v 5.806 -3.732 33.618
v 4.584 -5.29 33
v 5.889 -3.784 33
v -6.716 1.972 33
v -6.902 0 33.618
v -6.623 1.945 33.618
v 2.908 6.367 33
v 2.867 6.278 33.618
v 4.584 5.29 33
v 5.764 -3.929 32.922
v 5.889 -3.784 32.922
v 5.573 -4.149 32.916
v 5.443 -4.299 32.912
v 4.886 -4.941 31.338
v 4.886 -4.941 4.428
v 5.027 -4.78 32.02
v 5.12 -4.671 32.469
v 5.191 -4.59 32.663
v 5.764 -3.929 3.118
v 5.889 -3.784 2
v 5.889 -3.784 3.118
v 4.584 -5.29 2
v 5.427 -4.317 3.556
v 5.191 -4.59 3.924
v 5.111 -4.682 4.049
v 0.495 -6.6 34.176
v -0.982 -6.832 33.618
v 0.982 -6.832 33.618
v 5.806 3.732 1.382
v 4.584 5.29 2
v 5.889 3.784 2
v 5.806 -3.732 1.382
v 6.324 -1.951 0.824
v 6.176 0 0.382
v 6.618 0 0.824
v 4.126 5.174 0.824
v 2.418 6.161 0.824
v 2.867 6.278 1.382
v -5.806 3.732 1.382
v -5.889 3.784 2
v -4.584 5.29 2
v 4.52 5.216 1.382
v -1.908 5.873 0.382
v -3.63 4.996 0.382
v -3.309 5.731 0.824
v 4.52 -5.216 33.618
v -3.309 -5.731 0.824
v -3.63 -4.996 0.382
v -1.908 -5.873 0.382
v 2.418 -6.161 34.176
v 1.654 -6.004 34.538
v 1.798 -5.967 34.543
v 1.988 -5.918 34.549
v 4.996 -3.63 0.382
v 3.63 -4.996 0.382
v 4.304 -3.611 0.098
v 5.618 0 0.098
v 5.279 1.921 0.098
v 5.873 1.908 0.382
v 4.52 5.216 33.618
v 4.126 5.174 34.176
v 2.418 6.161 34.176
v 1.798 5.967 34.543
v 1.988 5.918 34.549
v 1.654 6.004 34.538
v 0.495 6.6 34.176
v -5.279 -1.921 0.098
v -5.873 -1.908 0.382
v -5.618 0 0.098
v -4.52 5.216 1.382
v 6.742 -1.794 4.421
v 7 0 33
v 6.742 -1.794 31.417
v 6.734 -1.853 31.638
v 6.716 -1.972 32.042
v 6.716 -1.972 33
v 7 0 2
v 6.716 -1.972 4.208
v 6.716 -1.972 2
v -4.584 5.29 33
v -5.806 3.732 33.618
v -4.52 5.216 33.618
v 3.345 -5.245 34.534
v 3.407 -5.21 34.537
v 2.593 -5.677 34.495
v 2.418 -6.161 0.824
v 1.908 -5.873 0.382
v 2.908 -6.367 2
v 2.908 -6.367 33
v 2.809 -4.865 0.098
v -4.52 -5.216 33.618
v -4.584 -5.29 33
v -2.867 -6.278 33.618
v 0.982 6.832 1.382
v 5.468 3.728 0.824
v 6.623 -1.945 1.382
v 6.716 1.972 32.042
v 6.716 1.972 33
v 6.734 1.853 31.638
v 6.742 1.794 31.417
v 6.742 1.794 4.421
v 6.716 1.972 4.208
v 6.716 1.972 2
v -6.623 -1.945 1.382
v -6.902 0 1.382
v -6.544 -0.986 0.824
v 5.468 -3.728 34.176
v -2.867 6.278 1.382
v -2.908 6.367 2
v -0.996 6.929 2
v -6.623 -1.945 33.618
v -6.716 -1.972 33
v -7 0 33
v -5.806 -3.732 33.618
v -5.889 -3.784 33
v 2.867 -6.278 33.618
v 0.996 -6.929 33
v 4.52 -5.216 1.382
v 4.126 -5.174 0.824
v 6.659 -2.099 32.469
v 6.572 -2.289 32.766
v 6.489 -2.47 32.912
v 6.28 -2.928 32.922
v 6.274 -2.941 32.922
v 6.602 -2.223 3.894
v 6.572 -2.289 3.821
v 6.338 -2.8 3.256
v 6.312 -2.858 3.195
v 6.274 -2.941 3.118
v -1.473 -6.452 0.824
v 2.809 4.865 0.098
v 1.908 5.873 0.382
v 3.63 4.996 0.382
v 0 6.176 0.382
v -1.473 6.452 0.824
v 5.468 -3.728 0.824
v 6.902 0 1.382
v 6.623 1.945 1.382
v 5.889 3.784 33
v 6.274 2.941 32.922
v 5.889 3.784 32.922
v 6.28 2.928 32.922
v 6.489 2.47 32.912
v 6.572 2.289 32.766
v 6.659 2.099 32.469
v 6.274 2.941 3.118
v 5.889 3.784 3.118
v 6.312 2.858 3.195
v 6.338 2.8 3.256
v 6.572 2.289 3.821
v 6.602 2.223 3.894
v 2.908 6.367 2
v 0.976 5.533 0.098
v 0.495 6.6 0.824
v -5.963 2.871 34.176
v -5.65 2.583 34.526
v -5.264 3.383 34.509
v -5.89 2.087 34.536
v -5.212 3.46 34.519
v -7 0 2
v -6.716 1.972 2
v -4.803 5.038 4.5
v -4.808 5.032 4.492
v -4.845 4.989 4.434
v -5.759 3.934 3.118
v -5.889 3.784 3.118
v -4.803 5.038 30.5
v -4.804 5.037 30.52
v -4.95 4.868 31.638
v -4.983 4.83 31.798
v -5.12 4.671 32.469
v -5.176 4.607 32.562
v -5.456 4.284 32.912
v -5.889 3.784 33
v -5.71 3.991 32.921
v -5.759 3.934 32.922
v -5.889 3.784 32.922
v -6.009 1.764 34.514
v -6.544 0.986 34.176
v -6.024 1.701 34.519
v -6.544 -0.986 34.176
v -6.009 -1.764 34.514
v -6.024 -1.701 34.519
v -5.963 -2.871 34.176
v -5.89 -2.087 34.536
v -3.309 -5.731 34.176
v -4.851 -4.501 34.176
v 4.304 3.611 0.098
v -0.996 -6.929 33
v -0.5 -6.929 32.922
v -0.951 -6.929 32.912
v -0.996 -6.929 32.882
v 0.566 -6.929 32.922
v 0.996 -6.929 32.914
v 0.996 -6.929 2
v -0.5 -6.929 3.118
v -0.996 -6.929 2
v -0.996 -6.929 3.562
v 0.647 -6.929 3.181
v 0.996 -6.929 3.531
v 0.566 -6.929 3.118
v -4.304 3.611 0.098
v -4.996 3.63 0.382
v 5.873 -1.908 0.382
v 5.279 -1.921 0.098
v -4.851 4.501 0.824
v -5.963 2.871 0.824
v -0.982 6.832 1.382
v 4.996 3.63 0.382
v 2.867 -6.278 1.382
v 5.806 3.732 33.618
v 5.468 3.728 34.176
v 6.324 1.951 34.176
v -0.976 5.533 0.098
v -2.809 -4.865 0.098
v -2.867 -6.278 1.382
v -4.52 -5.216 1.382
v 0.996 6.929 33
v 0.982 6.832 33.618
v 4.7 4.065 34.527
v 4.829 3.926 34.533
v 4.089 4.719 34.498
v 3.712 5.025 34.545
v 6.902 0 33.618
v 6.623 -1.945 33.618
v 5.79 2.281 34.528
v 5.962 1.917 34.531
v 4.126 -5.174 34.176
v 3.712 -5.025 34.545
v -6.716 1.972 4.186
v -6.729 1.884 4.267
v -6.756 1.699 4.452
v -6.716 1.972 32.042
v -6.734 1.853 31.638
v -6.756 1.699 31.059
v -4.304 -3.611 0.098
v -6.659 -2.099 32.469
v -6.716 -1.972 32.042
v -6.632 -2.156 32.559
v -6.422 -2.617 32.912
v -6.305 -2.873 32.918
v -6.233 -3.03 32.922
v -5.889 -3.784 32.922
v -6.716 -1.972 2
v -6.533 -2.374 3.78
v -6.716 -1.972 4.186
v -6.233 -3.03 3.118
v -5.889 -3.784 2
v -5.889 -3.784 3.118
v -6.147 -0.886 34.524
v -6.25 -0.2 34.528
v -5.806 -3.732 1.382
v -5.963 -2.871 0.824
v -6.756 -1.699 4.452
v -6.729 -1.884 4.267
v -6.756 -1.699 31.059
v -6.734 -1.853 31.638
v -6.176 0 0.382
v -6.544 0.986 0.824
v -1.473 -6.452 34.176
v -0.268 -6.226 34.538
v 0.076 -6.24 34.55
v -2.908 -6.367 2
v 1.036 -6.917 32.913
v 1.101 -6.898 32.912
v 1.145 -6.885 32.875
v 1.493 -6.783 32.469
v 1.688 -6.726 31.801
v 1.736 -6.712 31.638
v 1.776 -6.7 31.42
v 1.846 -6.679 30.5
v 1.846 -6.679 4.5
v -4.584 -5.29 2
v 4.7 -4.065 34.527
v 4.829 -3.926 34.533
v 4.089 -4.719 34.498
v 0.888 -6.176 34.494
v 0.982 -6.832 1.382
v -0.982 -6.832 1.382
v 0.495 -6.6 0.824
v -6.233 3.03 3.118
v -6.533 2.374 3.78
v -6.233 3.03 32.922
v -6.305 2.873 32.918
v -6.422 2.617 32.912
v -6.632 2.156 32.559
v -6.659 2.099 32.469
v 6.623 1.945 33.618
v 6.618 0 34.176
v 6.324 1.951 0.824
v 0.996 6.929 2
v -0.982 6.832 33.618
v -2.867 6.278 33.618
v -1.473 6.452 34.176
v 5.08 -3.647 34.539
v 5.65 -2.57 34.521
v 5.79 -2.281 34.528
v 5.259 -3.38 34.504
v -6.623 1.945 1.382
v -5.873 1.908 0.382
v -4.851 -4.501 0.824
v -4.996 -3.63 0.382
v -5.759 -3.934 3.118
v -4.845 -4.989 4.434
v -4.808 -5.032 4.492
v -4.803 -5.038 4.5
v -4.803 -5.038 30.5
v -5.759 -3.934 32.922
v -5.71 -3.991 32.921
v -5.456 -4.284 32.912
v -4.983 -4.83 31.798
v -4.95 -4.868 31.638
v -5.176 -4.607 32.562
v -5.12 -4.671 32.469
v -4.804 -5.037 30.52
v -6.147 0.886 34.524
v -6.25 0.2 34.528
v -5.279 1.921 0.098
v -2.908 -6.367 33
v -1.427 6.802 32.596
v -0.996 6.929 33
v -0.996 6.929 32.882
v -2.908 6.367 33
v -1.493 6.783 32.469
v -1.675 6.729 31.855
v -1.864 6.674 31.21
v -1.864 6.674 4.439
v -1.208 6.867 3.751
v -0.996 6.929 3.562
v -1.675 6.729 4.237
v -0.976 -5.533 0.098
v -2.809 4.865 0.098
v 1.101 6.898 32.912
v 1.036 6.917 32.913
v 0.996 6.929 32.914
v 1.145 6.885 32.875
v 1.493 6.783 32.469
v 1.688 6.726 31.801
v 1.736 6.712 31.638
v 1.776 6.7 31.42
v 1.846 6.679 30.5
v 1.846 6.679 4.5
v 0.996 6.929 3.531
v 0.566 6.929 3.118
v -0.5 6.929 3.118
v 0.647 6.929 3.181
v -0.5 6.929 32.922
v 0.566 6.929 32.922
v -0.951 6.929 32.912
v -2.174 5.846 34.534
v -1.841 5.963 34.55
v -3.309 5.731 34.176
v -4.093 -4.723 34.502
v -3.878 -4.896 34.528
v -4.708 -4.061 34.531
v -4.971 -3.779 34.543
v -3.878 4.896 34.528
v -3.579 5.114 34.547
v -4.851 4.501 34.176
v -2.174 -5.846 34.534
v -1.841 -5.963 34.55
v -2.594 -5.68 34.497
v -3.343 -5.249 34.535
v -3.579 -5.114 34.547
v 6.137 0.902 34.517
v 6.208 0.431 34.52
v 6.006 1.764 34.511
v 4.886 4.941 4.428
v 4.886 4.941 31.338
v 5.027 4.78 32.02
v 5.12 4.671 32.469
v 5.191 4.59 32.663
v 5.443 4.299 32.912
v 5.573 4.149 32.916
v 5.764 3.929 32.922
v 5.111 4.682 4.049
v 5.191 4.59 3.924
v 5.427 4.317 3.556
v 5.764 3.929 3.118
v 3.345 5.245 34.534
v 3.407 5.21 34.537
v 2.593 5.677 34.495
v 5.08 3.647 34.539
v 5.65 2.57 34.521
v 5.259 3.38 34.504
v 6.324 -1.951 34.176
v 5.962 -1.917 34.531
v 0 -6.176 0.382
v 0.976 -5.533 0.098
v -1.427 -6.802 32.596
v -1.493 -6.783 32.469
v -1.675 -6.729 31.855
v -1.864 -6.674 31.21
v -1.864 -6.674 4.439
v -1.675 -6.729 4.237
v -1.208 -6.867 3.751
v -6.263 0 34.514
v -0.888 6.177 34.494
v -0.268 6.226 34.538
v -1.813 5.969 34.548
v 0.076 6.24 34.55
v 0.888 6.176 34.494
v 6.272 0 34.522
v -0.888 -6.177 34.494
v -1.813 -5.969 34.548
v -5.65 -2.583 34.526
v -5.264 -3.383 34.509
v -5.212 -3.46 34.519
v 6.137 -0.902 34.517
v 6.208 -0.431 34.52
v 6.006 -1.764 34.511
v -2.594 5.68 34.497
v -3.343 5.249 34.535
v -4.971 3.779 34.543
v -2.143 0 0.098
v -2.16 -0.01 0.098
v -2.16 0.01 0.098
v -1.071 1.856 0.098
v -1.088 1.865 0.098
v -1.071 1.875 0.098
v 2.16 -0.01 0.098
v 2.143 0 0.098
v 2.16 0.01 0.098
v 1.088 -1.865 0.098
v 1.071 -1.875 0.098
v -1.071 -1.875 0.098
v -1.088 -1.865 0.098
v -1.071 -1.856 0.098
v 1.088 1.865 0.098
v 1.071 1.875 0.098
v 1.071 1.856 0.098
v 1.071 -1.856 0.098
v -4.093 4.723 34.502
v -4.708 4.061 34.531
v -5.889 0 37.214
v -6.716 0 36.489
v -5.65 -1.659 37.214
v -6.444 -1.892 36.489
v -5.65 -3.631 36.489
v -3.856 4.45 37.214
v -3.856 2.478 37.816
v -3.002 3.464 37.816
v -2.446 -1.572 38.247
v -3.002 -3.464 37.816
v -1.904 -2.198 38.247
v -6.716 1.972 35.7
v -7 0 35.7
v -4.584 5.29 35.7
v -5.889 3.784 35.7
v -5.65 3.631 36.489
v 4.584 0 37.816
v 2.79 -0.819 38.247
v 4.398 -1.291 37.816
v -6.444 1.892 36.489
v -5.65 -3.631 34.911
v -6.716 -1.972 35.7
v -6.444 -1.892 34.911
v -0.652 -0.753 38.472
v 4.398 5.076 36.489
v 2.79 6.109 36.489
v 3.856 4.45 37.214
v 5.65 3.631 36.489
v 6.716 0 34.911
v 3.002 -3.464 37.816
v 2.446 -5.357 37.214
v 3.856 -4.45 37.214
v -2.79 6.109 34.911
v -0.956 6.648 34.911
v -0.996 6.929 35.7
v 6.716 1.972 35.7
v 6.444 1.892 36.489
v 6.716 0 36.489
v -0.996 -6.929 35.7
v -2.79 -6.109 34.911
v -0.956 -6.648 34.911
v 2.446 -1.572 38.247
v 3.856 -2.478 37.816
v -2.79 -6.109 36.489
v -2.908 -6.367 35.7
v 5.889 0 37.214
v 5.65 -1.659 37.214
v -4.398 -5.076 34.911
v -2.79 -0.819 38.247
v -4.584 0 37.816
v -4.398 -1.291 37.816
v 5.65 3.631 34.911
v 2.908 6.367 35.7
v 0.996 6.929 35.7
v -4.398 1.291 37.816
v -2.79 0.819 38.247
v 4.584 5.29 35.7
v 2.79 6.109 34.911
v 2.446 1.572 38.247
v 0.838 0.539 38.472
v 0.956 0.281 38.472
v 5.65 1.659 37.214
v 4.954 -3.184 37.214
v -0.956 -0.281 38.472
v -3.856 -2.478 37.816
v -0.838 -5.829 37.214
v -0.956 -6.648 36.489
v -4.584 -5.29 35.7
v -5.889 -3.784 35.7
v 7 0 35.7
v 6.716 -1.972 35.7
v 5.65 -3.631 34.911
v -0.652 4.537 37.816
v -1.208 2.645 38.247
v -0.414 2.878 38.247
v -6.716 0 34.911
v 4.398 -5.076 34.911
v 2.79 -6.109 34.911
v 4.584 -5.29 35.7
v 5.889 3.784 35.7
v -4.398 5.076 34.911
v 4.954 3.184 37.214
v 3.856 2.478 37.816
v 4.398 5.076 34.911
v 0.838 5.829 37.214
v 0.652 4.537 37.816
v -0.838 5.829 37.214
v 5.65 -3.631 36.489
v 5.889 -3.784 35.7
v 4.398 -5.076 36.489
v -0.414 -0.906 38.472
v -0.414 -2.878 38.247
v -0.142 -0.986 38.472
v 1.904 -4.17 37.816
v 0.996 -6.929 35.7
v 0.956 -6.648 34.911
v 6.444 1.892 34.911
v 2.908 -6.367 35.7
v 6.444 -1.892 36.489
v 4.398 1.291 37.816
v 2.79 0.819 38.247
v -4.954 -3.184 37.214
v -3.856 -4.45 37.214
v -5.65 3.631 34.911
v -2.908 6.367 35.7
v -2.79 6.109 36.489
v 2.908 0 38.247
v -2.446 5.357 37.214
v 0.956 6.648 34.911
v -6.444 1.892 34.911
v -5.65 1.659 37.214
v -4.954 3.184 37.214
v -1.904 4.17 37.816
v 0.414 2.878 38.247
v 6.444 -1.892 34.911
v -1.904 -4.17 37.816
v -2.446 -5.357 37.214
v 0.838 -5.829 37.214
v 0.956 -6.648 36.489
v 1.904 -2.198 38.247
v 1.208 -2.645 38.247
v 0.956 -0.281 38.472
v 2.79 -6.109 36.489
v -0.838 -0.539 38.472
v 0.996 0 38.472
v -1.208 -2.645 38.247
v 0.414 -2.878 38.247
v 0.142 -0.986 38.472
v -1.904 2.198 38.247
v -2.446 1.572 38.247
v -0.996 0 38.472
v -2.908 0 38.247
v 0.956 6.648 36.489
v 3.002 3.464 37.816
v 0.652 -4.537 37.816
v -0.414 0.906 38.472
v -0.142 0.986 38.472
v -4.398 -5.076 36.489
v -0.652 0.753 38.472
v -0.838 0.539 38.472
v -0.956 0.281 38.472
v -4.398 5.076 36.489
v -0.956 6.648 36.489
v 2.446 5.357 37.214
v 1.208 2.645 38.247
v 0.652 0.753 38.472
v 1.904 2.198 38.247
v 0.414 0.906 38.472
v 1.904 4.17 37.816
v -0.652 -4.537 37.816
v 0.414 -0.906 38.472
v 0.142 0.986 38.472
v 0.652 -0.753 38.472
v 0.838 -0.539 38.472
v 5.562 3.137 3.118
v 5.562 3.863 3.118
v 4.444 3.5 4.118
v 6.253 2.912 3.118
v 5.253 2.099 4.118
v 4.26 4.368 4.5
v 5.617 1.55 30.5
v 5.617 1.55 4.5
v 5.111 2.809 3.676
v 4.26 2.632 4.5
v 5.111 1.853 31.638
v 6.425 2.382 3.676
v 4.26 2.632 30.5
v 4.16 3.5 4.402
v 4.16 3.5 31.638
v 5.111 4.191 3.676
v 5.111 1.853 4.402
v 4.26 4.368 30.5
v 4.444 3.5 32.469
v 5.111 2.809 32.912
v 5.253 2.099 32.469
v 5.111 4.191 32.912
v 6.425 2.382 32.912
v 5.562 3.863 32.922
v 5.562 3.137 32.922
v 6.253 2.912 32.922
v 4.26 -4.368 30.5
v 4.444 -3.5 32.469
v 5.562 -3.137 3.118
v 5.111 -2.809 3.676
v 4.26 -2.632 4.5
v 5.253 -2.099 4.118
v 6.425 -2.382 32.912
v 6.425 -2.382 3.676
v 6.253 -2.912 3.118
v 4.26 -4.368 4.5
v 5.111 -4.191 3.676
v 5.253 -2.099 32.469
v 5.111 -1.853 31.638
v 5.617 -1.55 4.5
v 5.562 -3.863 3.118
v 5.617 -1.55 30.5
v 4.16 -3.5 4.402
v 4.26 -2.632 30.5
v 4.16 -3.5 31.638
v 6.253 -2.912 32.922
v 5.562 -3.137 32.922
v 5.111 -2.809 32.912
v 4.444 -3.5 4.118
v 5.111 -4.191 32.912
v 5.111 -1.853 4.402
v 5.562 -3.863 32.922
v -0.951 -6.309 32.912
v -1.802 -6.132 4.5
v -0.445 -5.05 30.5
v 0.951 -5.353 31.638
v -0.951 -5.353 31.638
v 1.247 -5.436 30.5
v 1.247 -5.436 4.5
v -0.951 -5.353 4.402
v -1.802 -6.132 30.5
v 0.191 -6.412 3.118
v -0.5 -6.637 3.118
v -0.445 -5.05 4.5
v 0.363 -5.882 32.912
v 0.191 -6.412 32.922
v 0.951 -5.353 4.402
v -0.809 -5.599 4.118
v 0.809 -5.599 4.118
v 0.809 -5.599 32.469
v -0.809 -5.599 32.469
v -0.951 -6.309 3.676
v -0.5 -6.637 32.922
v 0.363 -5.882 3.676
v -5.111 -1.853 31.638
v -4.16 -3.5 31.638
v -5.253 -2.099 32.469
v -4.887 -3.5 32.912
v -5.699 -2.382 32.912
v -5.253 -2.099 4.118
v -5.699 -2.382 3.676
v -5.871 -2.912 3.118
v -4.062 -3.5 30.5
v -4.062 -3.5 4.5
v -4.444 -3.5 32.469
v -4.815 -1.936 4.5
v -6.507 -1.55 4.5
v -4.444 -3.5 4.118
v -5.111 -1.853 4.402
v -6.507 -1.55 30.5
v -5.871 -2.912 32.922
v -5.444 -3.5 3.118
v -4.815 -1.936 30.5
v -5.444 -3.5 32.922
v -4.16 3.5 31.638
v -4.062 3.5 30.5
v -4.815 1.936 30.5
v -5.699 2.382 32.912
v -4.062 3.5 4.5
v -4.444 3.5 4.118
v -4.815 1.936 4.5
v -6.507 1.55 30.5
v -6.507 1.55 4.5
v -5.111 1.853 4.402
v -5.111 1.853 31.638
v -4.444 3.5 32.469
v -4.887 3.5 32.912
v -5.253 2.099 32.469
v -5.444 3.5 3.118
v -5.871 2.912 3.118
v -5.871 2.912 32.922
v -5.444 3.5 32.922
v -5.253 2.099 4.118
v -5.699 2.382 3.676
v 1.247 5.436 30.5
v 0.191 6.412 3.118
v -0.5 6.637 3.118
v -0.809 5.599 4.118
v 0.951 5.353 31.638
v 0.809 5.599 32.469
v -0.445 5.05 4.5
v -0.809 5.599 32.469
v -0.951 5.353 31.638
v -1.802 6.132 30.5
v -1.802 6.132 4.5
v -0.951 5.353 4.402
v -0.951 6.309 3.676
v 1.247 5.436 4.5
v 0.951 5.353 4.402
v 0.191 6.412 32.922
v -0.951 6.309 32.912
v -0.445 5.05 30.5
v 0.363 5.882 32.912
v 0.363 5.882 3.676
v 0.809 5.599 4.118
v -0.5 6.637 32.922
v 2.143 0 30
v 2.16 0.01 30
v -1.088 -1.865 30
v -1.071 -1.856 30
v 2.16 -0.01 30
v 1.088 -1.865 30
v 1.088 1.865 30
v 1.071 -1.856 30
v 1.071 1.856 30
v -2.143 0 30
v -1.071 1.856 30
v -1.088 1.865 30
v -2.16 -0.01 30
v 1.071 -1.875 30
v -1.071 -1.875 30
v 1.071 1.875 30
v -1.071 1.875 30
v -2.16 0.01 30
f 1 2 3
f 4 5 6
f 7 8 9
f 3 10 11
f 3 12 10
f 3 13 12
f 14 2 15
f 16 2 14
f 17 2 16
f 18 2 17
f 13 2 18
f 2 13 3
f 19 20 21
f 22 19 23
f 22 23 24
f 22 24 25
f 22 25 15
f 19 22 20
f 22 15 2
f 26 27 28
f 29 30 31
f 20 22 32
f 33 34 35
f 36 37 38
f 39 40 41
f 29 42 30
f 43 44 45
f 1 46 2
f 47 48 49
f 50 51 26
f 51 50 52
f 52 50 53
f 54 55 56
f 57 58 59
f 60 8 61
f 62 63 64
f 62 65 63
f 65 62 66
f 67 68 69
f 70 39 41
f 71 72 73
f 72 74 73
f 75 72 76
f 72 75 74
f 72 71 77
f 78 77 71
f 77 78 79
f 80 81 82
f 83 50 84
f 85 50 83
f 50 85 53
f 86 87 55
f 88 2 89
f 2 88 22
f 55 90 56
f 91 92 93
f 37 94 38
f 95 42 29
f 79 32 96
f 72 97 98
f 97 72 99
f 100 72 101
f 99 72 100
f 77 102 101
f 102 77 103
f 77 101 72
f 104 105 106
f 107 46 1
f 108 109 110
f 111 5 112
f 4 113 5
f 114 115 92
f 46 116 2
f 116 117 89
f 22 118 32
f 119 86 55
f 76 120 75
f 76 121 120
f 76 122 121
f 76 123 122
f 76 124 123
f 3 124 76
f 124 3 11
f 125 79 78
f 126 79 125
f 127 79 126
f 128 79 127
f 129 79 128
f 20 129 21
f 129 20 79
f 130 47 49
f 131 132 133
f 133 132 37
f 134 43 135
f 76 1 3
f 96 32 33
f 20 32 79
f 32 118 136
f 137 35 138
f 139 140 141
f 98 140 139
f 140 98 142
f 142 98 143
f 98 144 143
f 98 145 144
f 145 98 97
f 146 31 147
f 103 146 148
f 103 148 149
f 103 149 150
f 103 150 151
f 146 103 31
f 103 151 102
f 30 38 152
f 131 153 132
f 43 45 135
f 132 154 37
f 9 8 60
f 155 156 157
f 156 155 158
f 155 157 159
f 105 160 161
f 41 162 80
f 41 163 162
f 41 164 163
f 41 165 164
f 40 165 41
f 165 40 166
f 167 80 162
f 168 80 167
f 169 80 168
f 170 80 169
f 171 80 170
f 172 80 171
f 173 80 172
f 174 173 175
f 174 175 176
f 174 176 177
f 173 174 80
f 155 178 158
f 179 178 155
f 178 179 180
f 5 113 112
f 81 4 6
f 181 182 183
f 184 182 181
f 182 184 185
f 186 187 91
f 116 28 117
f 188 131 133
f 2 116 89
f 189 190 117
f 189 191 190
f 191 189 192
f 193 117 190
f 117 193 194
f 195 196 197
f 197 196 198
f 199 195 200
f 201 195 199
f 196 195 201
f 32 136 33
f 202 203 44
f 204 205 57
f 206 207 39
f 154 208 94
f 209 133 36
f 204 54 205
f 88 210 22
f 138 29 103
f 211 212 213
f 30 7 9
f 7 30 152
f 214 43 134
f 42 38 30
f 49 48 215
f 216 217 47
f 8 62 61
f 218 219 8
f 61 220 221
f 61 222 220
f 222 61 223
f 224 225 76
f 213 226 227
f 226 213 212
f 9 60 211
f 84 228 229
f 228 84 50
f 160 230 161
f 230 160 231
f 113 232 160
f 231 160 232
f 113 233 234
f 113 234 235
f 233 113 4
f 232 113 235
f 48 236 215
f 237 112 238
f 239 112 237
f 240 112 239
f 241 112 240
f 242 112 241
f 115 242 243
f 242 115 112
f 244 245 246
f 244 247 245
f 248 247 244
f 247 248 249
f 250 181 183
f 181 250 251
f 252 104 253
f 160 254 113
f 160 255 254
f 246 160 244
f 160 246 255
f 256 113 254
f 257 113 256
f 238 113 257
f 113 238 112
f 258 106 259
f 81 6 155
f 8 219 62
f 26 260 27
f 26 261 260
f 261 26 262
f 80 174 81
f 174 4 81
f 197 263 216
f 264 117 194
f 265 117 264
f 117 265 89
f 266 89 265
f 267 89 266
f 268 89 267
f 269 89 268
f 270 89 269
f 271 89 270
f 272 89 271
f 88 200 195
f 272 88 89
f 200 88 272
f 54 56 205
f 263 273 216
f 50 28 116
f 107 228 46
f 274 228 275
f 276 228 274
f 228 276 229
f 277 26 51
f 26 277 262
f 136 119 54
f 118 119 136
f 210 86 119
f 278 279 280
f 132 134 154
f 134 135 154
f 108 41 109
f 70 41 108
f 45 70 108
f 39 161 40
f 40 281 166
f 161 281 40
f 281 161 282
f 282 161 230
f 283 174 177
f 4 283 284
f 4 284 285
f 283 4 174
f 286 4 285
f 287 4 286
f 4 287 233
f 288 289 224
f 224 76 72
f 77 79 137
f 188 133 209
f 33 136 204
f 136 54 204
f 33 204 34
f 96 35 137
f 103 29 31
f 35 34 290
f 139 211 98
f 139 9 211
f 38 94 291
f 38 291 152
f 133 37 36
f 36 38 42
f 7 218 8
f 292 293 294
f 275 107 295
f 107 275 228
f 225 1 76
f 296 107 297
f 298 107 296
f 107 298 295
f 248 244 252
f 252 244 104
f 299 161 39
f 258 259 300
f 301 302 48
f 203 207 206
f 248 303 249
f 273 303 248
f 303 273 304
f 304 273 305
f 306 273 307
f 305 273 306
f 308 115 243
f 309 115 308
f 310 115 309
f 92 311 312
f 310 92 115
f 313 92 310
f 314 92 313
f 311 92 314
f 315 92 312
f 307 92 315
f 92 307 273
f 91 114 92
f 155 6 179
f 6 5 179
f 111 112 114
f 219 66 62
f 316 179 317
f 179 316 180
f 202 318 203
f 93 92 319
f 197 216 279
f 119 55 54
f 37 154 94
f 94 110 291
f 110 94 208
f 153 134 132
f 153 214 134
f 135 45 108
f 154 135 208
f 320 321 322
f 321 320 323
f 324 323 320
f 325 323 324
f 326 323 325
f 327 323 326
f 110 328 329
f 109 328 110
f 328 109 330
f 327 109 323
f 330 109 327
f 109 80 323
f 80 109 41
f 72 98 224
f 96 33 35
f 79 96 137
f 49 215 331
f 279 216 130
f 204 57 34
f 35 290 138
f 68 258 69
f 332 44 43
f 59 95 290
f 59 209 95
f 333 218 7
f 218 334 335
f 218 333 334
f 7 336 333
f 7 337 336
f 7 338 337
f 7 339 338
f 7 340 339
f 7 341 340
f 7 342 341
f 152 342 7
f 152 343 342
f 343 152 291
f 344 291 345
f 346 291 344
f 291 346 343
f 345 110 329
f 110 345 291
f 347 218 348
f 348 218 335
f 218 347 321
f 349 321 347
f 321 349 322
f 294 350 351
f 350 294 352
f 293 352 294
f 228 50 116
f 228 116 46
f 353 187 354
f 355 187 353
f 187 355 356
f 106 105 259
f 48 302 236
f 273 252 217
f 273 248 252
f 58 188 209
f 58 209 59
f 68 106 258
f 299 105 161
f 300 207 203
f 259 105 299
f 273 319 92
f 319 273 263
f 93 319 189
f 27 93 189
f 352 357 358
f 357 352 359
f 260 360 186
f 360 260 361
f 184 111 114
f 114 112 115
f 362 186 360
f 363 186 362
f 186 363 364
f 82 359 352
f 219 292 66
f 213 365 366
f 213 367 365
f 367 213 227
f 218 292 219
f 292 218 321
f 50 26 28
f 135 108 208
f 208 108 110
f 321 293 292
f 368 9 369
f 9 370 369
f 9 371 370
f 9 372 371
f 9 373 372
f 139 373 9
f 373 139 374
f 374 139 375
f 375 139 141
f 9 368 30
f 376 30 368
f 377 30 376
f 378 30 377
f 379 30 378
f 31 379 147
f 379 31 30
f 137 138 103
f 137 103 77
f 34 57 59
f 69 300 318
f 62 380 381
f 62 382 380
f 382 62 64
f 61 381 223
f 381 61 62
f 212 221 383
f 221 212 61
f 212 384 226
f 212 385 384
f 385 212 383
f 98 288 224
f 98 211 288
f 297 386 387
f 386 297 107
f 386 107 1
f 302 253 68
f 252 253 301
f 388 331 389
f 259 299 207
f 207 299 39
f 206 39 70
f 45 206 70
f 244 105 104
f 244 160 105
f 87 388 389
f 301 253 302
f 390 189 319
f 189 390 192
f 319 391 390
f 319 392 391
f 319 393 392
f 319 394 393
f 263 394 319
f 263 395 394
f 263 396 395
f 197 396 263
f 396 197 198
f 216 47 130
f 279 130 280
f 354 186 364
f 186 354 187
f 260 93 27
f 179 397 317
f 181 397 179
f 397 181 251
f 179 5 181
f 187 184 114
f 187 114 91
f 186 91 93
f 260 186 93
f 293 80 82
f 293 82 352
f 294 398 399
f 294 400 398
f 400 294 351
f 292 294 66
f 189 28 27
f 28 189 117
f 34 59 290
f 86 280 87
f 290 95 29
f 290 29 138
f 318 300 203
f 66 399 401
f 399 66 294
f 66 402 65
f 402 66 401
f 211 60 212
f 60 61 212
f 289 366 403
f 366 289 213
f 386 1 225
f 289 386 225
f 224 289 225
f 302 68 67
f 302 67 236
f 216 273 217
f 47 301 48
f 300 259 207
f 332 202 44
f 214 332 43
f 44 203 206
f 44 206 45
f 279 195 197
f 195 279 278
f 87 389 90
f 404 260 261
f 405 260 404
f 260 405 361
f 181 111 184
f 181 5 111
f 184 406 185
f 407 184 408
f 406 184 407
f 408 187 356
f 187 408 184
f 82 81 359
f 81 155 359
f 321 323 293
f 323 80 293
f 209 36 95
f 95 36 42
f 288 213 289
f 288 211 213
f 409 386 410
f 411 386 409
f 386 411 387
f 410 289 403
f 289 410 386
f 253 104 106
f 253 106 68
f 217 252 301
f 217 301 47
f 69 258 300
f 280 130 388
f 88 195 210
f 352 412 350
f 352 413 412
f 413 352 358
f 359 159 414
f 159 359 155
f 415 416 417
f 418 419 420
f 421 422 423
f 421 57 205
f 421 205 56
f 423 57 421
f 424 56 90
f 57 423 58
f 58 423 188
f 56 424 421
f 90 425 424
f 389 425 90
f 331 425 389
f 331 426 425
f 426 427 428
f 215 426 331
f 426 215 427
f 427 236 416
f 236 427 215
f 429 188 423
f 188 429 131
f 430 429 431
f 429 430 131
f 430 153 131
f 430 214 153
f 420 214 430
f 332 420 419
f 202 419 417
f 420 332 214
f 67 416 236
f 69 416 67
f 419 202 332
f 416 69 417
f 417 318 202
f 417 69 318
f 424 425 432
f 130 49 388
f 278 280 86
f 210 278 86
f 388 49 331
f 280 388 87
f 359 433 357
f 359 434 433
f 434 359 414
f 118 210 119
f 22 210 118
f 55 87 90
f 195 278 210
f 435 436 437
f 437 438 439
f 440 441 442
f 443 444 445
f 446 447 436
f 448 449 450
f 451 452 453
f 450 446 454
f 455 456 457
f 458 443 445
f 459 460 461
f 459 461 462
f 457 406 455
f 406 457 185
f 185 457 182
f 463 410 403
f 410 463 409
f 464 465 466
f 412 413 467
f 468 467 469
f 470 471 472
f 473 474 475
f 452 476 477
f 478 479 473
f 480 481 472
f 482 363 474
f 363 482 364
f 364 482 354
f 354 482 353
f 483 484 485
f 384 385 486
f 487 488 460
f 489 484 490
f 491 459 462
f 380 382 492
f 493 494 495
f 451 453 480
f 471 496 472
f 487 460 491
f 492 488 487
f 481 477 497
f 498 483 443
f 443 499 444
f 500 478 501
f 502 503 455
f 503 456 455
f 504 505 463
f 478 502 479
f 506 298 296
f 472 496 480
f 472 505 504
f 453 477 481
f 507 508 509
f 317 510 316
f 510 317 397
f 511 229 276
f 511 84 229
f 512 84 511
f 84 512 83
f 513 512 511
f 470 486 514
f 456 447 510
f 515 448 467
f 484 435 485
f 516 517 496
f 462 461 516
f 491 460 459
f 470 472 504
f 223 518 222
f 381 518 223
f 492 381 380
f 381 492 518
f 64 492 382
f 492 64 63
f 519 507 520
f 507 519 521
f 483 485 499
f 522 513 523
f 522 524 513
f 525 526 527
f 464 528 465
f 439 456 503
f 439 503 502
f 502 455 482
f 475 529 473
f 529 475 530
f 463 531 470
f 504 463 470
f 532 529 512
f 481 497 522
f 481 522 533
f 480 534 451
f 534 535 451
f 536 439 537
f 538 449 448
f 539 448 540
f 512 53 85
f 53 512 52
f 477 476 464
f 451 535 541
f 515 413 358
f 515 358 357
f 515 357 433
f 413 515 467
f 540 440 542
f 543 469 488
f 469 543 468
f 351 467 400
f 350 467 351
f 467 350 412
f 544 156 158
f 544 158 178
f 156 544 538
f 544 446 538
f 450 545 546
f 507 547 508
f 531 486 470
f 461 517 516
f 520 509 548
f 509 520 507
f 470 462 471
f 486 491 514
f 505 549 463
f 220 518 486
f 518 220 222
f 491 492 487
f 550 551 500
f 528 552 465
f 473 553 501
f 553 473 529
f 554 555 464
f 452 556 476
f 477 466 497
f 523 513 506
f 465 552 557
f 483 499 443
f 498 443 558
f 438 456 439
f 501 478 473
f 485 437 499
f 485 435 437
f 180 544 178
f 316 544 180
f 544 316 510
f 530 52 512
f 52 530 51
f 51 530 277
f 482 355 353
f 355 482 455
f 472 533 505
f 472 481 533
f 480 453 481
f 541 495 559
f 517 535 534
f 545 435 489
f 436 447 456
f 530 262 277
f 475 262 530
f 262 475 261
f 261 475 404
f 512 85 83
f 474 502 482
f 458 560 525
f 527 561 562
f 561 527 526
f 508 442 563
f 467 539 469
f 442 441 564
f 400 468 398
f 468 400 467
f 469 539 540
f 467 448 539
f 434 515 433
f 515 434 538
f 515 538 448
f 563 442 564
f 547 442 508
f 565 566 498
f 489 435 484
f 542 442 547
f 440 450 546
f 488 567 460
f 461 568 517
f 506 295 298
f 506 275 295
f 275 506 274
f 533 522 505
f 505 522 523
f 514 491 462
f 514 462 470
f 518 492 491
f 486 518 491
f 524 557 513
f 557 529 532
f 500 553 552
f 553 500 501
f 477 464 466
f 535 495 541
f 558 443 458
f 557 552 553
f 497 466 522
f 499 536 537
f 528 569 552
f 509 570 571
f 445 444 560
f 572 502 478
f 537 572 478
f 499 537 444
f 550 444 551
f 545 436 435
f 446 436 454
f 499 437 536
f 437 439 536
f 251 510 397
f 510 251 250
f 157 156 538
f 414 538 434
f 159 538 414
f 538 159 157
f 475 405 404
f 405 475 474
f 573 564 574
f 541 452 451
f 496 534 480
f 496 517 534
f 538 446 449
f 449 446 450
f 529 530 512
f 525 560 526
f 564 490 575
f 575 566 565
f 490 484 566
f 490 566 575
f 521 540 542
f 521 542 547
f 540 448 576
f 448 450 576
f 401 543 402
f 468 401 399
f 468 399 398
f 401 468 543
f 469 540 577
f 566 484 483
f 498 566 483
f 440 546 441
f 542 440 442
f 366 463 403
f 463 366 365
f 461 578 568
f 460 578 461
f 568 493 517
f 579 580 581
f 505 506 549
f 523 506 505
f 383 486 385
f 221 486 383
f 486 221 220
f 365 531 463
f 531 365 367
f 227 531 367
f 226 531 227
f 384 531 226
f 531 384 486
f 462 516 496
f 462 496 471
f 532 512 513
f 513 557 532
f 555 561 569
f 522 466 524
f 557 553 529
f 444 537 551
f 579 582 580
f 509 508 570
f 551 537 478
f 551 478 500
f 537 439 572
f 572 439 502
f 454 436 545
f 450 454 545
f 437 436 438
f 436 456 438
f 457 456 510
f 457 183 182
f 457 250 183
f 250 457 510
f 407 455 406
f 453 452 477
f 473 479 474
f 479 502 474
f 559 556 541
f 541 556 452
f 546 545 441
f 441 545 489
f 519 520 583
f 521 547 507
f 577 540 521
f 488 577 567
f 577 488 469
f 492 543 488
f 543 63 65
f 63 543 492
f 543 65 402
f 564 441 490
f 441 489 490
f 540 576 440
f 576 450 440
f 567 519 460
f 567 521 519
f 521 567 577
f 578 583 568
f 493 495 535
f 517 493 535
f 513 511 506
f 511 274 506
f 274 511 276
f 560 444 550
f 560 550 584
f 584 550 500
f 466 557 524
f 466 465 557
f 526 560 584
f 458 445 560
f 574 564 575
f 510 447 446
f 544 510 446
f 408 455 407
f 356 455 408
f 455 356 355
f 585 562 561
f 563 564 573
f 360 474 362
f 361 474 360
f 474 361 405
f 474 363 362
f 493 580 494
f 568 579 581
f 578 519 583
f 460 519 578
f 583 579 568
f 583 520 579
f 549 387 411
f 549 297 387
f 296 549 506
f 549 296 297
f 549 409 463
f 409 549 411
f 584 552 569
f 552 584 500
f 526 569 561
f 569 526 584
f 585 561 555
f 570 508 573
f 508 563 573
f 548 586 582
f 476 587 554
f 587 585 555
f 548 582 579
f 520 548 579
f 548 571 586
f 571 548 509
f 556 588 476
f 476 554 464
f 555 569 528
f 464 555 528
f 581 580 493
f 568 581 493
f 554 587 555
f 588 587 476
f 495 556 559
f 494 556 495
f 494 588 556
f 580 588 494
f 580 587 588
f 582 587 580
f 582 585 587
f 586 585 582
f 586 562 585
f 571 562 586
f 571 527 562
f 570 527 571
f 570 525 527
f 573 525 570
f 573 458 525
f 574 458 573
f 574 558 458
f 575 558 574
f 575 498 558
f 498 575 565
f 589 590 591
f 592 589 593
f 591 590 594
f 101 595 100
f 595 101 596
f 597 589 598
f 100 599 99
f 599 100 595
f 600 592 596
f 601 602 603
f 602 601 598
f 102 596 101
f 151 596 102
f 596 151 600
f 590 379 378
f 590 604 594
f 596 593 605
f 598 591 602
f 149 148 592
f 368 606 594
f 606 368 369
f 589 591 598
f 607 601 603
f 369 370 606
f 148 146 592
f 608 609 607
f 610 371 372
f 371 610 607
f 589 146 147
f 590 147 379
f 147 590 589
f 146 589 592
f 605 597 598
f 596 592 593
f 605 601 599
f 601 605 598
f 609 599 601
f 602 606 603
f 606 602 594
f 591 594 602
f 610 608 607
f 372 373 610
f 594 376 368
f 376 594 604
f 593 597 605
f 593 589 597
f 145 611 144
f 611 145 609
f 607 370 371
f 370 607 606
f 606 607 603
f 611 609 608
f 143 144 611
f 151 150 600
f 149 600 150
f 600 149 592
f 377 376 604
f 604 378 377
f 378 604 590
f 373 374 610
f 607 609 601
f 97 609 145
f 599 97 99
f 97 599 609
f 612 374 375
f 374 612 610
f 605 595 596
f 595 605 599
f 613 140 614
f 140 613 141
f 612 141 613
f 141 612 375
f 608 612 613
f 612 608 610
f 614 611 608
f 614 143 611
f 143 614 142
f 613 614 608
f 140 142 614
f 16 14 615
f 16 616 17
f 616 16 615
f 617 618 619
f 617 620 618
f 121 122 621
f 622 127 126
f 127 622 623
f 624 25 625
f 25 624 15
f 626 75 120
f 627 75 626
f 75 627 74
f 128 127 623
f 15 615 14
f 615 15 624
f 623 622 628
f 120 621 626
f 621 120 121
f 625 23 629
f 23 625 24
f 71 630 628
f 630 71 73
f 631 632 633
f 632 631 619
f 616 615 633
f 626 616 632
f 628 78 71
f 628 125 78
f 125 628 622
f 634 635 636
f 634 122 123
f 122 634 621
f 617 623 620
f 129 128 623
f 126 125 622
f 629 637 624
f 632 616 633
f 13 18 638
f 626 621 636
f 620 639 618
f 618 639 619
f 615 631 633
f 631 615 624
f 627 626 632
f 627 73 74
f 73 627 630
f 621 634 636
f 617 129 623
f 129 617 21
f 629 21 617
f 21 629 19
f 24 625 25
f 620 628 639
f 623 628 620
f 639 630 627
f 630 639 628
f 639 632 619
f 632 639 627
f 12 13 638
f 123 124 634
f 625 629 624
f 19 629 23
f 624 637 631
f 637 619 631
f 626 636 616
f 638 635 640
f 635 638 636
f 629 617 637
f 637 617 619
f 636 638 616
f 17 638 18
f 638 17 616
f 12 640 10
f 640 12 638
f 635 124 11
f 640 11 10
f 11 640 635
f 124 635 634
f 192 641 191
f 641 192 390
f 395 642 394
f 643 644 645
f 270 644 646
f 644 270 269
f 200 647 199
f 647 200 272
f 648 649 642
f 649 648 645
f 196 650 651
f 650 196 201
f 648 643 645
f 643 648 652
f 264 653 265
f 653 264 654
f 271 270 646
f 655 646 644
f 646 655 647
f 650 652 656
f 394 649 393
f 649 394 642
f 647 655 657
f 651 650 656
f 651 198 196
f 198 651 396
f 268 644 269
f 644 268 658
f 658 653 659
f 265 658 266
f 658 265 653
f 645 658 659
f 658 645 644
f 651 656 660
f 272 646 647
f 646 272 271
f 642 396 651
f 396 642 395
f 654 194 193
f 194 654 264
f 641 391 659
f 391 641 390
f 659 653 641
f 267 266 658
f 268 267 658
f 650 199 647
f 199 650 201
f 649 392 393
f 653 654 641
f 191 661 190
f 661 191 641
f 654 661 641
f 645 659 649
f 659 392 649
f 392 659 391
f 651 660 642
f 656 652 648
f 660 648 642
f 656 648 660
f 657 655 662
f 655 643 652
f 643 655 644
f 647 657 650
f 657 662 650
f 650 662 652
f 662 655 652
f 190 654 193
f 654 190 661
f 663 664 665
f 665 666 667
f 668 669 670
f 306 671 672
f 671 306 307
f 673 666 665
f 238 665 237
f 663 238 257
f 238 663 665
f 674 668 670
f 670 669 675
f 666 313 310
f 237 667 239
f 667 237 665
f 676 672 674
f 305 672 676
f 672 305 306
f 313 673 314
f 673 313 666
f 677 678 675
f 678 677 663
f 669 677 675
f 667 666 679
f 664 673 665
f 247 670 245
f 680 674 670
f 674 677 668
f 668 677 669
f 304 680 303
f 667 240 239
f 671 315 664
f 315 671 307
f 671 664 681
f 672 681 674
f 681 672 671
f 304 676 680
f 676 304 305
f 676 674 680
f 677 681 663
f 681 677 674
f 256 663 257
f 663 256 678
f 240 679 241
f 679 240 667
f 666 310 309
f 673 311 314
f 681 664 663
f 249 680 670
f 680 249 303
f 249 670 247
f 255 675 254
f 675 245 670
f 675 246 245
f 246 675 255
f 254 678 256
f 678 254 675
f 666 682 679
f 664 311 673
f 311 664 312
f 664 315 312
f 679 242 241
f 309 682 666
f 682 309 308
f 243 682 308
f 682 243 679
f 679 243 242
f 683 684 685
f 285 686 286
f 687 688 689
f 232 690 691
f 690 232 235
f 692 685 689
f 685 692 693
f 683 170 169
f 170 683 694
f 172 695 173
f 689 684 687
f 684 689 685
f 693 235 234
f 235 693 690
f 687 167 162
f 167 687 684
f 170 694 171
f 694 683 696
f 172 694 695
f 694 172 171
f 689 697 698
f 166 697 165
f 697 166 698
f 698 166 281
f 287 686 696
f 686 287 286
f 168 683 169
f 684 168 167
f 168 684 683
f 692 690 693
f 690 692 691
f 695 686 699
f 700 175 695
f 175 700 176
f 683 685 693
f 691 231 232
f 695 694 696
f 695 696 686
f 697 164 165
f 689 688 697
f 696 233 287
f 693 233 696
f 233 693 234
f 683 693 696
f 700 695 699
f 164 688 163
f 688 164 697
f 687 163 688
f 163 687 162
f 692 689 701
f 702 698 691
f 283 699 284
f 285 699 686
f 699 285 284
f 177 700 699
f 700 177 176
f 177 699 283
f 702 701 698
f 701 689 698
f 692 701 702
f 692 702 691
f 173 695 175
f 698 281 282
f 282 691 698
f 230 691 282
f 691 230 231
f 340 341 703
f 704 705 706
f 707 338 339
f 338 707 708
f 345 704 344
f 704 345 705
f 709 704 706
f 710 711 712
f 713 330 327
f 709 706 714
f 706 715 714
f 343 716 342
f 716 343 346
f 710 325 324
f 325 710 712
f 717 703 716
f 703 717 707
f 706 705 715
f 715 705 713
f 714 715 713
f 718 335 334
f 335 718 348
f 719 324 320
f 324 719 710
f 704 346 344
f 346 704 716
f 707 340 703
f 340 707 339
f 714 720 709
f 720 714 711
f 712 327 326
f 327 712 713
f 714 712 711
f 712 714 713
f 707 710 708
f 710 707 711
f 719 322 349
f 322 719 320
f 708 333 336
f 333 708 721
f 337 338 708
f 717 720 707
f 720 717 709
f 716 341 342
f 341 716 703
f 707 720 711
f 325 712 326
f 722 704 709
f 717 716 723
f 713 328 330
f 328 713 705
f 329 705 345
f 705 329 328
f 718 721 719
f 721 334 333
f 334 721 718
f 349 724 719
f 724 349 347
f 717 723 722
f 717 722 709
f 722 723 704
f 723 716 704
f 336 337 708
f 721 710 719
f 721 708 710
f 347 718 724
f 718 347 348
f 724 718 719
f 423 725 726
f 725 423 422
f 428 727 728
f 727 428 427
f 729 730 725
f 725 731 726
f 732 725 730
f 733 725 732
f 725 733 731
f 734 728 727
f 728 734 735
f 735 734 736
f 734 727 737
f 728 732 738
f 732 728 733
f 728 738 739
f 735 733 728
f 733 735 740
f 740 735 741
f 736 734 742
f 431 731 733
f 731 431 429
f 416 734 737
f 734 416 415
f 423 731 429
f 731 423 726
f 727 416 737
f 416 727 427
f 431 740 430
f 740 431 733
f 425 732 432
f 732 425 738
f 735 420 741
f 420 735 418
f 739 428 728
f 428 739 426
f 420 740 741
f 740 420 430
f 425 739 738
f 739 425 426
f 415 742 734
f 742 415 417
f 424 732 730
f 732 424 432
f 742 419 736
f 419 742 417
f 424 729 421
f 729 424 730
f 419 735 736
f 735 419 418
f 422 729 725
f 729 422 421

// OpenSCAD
bitSize=7.5; // this is the maximum diameter of the bit in mm
bitLength=30;//defines the amount the bit will be embedded in the driver
driverRadius=7; //radius of the driver
driverHeight=35; //height of the driver (currently is the height of the body, i am too lazy to fix it to be the overall height of the driver... sorry
numOfGrips=6;// number of cut outs for your fingers to grab
gripRadius=2;// defines the radius of the figer holds
gripHeight=30;//defines the length of the finger holds
bevelRadius=2;// this defines the curve at the bottom
SmoothingAmount=5;// this is the smoothing factor on the rounded caps 

module driverBase(){
	hull(){
		for(i=[1:SmoothingAmount])
		{
  			translate([0,0,+bevelRadius-bevelRadius*cos(i*90/SmoothingAmount)])cylinder(r=(driverRadius-bevelRadius+bevelRadius*sin(i*90/SmoothingAmount)),h=(driverHeight-2*bevelRadius+2*bevelRadius*cos(i*90/SmoothingAmount)));
		}
	}
}

module grips(){
	for(i=[1:numOfGrips])
	{
	hull(){
		for(n=[1:SmoothingAmount])
			translate([driverRadius*sin(i*360/numOfGrips),driverRadius*cos(i*360/numOfGrips),(driverHeight-gripHeight)/2+gripRadius*sin(n*90/SmoothingAmount)]) cylinder(r=gripRadius*sin(n*90/SmoothingAmount),h=gripHeight-2*gripRadius+2*gripRadius*cos(n*90/SmoothingAmount));
		}
	}
}
module hexagon(size, height) {
  boxWidth = size/1.75;
  for (r = [-60, 0, 60]) rotate([0,0,r]) cube([boxWidth, size, height], true);
}
module head(){
translate([0,0,driverHeight+.1*driverRadius]) scale([1,1,.4]) sphere(driverRadius);
}
difference(){
union(){
driverBase();
head();
}
grips();
translate(0,0,bitLength)hexagon(bitSize/2,bitLength*2);
}
